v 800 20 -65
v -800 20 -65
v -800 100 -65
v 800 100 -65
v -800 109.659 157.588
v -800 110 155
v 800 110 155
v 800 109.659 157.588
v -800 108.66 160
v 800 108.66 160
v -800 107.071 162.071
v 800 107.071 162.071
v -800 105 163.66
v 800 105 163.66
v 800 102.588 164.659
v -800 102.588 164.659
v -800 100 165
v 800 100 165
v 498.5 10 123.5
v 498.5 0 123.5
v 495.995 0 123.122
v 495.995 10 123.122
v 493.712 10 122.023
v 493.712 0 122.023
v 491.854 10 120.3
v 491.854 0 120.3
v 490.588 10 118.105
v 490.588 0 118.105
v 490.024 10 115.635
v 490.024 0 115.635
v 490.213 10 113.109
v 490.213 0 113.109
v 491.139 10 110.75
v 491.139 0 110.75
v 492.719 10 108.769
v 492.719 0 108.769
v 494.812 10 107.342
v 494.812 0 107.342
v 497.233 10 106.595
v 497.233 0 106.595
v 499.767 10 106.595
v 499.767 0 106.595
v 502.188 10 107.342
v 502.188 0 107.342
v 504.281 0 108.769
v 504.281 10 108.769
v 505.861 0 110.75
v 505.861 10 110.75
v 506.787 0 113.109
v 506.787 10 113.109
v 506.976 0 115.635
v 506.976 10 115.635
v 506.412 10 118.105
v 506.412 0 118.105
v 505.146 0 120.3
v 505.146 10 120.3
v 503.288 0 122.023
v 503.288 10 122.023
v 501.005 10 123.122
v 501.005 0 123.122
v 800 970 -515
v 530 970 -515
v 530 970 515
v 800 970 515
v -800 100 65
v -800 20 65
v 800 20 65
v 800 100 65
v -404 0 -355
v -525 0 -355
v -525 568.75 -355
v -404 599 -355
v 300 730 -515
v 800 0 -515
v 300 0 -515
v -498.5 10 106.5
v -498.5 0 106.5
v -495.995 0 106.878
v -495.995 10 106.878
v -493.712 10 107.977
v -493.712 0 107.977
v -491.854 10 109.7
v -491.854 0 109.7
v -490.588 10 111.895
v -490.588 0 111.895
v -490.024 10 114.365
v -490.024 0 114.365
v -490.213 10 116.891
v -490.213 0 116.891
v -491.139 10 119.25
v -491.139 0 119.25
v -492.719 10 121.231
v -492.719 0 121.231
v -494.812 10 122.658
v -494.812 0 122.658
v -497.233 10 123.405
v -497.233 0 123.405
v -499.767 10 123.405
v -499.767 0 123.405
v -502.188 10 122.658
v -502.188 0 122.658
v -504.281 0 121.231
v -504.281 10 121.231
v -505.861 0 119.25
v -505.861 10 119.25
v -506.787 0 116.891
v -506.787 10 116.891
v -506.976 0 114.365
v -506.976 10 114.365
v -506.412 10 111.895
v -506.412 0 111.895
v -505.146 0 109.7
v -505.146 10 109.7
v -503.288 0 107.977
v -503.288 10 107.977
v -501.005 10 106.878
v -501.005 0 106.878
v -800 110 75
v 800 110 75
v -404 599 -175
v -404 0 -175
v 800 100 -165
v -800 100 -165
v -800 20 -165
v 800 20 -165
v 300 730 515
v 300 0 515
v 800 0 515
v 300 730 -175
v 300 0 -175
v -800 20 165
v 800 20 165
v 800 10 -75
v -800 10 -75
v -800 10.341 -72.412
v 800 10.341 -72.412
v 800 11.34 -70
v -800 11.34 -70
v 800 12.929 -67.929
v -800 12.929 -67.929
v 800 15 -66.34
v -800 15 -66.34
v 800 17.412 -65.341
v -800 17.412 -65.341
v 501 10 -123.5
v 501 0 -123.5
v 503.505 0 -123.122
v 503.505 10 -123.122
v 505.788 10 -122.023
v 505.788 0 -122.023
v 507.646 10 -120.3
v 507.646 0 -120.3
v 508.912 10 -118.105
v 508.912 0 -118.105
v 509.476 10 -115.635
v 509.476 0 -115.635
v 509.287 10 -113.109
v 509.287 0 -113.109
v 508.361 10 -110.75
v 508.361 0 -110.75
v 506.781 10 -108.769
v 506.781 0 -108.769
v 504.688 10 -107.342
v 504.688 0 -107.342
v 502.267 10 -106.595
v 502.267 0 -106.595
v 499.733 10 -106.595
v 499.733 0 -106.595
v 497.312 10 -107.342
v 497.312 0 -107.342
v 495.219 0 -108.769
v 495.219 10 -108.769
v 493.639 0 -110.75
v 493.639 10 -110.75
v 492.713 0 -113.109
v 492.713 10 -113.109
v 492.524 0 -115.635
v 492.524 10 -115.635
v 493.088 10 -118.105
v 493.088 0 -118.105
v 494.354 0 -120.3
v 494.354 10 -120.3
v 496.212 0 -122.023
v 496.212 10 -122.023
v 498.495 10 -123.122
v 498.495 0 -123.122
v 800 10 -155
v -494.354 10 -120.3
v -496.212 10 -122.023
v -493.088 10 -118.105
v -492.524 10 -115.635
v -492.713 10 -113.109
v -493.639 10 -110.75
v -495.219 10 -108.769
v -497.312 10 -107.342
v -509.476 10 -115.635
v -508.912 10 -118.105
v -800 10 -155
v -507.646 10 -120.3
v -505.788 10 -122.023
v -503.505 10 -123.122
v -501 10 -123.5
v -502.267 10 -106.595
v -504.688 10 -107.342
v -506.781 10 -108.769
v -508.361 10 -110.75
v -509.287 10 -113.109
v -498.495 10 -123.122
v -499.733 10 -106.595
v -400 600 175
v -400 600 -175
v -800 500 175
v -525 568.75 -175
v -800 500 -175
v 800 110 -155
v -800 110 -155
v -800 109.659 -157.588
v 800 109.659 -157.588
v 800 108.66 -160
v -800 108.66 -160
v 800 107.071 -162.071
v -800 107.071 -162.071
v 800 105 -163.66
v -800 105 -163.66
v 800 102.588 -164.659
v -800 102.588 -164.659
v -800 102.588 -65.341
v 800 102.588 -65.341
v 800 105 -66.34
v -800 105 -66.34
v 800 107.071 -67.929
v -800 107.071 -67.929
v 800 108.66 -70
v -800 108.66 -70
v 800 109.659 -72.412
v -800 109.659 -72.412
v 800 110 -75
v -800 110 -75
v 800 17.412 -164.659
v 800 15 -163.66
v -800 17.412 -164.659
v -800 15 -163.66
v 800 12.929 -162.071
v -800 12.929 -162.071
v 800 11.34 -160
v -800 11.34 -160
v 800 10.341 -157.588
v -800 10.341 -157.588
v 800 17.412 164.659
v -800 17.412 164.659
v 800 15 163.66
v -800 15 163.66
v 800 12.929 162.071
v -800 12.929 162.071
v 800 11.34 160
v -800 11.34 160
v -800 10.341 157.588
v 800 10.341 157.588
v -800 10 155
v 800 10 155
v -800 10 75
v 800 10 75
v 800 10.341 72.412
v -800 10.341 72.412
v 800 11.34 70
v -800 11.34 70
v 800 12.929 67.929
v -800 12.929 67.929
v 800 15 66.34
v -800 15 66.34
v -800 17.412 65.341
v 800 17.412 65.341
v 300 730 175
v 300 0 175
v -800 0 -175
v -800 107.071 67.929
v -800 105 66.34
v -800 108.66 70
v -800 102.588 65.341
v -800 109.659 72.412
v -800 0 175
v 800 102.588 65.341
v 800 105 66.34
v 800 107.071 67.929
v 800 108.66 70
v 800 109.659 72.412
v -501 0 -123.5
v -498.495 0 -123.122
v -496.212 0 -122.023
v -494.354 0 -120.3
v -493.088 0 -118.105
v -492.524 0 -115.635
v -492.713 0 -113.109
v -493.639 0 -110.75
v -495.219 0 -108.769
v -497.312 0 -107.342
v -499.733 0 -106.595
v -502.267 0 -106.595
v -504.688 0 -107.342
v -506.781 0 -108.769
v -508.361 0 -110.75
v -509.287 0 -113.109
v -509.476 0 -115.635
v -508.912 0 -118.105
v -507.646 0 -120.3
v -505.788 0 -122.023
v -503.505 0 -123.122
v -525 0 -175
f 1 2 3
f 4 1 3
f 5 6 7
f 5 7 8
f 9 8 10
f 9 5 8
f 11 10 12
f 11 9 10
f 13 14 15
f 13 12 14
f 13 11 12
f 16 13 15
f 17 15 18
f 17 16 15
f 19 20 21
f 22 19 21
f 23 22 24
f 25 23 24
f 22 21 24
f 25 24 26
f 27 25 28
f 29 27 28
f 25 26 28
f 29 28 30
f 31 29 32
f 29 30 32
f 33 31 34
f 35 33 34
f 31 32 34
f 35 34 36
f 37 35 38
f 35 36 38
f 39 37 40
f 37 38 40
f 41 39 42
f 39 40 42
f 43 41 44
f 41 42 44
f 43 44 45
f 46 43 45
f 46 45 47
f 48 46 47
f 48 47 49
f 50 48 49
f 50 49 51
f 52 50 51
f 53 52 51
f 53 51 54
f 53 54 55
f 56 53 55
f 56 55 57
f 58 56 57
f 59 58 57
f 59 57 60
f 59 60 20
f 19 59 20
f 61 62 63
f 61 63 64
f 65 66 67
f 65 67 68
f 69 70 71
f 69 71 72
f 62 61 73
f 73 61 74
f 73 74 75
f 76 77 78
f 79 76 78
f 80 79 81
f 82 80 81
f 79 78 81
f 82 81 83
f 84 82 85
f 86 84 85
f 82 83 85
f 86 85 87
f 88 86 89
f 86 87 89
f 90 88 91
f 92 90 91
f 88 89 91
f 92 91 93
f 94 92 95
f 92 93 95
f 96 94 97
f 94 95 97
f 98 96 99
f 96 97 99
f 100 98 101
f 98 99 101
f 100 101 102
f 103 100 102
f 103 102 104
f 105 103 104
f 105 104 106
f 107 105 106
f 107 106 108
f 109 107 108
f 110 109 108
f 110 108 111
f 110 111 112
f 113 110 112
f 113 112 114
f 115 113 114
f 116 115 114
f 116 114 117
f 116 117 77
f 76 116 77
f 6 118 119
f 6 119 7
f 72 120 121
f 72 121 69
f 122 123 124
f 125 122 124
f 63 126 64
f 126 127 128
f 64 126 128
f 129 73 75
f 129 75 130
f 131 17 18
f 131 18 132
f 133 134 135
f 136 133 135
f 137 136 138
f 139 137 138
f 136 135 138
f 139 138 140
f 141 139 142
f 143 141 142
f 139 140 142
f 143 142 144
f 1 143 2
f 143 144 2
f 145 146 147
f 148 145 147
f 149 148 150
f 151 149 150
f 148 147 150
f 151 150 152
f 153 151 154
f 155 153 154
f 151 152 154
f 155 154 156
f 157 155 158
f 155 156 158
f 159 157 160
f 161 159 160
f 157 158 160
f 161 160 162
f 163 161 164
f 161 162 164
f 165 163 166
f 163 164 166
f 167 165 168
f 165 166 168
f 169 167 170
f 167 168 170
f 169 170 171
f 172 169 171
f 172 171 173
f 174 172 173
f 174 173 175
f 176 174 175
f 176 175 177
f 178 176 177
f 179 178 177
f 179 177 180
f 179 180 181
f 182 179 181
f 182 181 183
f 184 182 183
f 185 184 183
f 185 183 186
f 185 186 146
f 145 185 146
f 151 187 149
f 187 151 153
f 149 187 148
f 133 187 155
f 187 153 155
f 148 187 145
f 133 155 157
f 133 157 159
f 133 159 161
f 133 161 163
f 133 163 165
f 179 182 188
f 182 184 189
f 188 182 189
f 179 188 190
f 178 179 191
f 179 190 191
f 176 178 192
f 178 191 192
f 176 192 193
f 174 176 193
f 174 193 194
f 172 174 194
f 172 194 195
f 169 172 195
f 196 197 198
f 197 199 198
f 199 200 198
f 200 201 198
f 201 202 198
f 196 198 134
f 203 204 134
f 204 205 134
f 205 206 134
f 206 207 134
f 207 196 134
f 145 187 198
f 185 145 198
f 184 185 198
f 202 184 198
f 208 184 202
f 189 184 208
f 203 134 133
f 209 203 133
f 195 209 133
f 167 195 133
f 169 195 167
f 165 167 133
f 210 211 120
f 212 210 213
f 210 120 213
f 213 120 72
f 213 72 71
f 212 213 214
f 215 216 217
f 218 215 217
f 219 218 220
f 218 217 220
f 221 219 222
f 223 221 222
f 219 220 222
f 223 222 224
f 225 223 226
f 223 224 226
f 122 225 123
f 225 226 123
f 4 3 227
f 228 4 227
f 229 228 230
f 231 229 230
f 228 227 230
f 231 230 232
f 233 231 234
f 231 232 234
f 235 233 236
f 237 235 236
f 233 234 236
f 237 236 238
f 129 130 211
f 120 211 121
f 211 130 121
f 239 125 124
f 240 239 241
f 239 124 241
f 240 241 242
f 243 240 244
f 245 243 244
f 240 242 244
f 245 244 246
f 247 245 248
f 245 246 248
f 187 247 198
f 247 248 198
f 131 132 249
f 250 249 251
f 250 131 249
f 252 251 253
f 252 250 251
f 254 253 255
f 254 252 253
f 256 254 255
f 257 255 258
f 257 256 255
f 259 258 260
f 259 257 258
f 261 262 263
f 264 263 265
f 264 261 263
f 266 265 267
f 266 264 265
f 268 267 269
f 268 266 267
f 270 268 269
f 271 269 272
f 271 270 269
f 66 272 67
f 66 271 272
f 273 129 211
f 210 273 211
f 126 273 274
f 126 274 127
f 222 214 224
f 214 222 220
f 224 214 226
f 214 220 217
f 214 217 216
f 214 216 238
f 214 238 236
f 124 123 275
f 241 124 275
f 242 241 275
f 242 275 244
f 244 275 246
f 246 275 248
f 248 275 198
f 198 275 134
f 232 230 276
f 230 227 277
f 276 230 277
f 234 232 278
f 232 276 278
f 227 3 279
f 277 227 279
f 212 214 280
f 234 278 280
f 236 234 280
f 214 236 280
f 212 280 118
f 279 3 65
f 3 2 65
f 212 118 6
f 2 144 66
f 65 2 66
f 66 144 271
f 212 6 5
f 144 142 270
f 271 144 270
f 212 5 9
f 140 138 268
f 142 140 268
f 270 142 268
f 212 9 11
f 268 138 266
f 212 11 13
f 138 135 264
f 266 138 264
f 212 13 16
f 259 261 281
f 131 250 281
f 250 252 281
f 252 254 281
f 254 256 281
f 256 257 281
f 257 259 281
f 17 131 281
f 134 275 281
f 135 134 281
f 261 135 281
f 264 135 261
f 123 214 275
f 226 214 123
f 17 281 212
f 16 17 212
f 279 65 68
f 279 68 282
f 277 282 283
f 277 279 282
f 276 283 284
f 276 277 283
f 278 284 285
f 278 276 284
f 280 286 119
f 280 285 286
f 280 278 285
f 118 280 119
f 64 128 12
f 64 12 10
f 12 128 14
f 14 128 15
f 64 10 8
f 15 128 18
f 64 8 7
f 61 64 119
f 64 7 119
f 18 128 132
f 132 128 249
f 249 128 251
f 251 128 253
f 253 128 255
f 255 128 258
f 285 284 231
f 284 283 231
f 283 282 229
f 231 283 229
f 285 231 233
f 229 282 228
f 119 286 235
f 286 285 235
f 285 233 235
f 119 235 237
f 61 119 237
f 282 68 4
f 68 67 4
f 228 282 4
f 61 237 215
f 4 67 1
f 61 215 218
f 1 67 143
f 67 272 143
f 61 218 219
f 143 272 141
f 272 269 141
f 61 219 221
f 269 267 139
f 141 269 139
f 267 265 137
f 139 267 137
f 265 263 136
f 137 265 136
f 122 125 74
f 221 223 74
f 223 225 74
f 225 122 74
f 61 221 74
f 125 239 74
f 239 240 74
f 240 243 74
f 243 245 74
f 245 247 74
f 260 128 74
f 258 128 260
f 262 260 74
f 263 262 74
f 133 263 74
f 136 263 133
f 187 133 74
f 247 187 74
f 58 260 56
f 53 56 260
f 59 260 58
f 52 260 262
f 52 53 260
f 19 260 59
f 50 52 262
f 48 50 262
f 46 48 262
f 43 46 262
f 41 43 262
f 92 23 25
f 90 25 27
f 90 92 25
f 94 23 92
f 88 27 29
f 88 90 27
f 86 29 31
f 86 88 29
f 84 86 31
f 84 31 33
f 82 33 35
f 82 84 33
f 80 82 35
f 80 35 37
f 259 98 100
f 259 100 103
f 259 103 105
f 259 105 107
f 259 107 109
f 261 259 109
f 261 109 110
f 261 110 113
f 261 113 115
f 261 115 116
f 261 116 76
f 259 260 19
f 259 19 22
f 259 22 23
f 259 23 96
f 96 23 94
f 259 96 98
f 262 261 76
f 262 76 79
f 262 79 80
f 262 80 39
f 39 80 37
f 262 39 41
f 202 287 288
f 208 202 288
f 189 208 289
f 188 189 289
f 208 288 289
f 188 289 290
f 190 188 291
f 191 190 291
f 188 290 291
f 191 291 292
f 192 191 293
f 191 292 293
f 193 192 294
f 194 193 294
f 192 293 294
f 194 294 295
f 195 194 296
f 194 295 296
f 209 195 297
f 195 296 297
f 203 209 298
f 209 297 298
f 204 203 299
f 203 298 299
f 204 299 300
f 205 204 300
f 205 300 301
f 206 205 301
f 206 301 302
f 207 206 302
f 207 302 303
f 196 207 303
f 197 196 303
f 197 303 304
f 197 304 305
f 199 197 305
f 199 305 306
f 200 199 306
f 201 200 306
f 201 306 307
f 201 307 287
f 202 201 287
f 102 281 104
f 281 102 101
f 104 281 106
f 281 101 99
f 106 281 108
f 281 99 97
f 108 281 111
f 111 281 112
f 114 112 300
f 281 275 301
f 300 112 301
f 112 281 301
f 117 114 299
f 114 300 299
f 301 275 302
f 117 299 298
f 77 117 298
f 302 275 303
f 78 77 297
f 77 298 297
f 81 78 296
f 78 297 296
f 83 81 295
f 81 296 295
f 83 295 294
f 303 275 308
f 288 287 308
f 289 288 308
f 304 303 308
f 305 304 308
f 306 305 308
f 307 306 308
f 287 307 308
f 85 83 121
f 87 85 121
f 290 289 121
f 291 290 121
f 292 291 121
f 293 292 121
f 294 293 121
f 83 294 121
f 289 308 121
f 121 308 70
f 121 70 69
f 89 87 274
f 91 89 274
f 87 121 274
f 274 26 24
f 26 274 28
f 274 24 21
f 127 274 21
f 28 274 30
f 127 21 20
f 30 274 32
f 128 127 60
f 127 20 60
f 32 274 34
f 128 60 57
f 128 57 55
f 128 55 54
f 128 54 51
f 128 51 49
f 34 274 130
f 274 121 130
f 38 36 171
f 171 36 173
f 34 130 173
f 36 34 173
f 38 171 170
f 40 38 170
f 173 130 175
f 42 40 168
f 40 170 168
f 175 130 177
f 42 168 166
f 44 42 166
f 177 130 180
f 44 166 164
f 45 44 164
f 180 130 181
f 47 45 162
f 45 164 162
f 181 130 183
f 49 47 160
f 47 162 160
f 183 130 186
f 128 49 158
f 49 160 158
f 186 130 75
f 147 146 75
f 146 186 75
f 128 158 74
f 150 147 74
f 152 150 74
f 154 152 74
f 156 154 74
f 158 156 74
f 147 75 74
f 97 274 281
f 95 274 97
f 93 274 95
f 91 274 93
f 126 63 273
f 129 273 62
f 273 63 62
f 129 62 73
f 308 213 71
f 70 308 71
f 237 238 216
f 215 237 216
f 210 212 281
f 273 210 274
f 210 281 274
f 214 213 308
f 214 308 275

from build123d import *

# Parameters (mm, degrees)
SKETCH2_W               = 121
SKETCH2_H               = 180
BOSS_EXTRUDE1_DEPTH     = 970
CUT_EXTRUDE1_DEPTH      = 1359.721825835
CUT_EXTRUDE1_DEPTH_BACK = 1359.721825835
CUT_EXTRUDE5_DEPTH      = 1625
SKETCH4_R               = 8.5
CUT_EXTRUDE6_DEPTH      = 78


with BuildPart() as part:
    # Sketch2 → Boss-Extrude1 (new body)
    with BuildSketch(Plane(origin=(0, 0, 0), x_dir=(1, 0, 0), z_dir=(0, 1, 0))):
        Polygon((300, -515), (800, -515), (800, 515), (300, 515), (300, 175), (-404, 175), (-525, 175), (-800, 175), (-800, -175), (300, -175), align=None)
        with Locations((-464.5, 265)):
            Rectangle(SKETCH2_W, SKETCH2_H)
    extrude(amount=BOSS_EXTRUDE1_DEPTH)

    # Sketch1 → Cut-Extrude1 (cut, two sides: drawn at the far end of the back side and taken through both)
    with BuildSketch(Plane.XY.offset(-CUT_EXTRUDE1_DEPTH_BACK)):
        Polygon((-800, 970), (530, 970), (300, 730), (-400, 600), (-800, 500), align=None)
    extrude(amount=CUT_EXTRUDE1_DEPTH + CUT_EXTRUDE1_DEPTH_BACK, mode=Mode.SUBTRACT)

    # Sketch3 → Cut-Extrude5 (cut)
    with BuildSketch(Plane.ZY.offset(800)):
        with BuildLine():
            Line((-165, 100), (-165, 20))
            ThreePointArc((-165, 20), (-162.071067812, 12.928932188), (-155, 10))
            Line((-155, 10), (-75, 10))
            ThreePointArc((-75, 10), (-67.928932188, 12.928932188), (-65, 20))
            Line((-65, 20), (-65, 100))
            ThreePointArc((-65, 100), (-67.928932188, 107.071067812), (-75, 110))
            Line((-75, 110), (-155, 110))
            ThreePointArc((-155, 110), (-162.071067812, 107.071067812), (-165, 100))
        make_face()
        with BuildLine():
            Line((75, 110), (155, 110))
            ThreePointArc((155, 110), (162.071067812, 107.071067812), (165, 100))
            Line((165, 100), (165, 20))
            ThreePointArc((165, 20), (162.071067812, 12.928932188), (155, 10))
            Line((155, 10), (75, 10))
            ThreePointArc((75, 10), (67.928932188, 12.928932188), (65, 20))
            Line((65, 20), (65, 100))
            ThreePointArc((65, 100), (67.928932188, 107.071067812), (75, 110))
        make_face()
    extrude(amount=-CUT_EXTRUDE5_DEPTH, mode=Mode.SUBTRACT)

    # Sketch4 → Cut-Extrude6 (cut)
    with BuildSketch(Plane.XZ):
        with Locations(Location((-498.5, 115, 0), (0, 0, 270))):
            Circle(SKETCH4_R)
        with Locations(Location((-501, -115, 0), (0, 0, 270))):
            Circle(SKETCH4_R)
        with Locations(Location((501, -115, 0), (0, 0, 270))):
            Circle(SKETCH4_R)
        with Locations(Location((498.5, 115, 0), (0, 0, 90))):
            Circle(SKETCH4_R)
    extrude(amount=-CUT_EXTRUDE6_DEPTH, mode=Mode.SUBTRACT)


solid = part.part
